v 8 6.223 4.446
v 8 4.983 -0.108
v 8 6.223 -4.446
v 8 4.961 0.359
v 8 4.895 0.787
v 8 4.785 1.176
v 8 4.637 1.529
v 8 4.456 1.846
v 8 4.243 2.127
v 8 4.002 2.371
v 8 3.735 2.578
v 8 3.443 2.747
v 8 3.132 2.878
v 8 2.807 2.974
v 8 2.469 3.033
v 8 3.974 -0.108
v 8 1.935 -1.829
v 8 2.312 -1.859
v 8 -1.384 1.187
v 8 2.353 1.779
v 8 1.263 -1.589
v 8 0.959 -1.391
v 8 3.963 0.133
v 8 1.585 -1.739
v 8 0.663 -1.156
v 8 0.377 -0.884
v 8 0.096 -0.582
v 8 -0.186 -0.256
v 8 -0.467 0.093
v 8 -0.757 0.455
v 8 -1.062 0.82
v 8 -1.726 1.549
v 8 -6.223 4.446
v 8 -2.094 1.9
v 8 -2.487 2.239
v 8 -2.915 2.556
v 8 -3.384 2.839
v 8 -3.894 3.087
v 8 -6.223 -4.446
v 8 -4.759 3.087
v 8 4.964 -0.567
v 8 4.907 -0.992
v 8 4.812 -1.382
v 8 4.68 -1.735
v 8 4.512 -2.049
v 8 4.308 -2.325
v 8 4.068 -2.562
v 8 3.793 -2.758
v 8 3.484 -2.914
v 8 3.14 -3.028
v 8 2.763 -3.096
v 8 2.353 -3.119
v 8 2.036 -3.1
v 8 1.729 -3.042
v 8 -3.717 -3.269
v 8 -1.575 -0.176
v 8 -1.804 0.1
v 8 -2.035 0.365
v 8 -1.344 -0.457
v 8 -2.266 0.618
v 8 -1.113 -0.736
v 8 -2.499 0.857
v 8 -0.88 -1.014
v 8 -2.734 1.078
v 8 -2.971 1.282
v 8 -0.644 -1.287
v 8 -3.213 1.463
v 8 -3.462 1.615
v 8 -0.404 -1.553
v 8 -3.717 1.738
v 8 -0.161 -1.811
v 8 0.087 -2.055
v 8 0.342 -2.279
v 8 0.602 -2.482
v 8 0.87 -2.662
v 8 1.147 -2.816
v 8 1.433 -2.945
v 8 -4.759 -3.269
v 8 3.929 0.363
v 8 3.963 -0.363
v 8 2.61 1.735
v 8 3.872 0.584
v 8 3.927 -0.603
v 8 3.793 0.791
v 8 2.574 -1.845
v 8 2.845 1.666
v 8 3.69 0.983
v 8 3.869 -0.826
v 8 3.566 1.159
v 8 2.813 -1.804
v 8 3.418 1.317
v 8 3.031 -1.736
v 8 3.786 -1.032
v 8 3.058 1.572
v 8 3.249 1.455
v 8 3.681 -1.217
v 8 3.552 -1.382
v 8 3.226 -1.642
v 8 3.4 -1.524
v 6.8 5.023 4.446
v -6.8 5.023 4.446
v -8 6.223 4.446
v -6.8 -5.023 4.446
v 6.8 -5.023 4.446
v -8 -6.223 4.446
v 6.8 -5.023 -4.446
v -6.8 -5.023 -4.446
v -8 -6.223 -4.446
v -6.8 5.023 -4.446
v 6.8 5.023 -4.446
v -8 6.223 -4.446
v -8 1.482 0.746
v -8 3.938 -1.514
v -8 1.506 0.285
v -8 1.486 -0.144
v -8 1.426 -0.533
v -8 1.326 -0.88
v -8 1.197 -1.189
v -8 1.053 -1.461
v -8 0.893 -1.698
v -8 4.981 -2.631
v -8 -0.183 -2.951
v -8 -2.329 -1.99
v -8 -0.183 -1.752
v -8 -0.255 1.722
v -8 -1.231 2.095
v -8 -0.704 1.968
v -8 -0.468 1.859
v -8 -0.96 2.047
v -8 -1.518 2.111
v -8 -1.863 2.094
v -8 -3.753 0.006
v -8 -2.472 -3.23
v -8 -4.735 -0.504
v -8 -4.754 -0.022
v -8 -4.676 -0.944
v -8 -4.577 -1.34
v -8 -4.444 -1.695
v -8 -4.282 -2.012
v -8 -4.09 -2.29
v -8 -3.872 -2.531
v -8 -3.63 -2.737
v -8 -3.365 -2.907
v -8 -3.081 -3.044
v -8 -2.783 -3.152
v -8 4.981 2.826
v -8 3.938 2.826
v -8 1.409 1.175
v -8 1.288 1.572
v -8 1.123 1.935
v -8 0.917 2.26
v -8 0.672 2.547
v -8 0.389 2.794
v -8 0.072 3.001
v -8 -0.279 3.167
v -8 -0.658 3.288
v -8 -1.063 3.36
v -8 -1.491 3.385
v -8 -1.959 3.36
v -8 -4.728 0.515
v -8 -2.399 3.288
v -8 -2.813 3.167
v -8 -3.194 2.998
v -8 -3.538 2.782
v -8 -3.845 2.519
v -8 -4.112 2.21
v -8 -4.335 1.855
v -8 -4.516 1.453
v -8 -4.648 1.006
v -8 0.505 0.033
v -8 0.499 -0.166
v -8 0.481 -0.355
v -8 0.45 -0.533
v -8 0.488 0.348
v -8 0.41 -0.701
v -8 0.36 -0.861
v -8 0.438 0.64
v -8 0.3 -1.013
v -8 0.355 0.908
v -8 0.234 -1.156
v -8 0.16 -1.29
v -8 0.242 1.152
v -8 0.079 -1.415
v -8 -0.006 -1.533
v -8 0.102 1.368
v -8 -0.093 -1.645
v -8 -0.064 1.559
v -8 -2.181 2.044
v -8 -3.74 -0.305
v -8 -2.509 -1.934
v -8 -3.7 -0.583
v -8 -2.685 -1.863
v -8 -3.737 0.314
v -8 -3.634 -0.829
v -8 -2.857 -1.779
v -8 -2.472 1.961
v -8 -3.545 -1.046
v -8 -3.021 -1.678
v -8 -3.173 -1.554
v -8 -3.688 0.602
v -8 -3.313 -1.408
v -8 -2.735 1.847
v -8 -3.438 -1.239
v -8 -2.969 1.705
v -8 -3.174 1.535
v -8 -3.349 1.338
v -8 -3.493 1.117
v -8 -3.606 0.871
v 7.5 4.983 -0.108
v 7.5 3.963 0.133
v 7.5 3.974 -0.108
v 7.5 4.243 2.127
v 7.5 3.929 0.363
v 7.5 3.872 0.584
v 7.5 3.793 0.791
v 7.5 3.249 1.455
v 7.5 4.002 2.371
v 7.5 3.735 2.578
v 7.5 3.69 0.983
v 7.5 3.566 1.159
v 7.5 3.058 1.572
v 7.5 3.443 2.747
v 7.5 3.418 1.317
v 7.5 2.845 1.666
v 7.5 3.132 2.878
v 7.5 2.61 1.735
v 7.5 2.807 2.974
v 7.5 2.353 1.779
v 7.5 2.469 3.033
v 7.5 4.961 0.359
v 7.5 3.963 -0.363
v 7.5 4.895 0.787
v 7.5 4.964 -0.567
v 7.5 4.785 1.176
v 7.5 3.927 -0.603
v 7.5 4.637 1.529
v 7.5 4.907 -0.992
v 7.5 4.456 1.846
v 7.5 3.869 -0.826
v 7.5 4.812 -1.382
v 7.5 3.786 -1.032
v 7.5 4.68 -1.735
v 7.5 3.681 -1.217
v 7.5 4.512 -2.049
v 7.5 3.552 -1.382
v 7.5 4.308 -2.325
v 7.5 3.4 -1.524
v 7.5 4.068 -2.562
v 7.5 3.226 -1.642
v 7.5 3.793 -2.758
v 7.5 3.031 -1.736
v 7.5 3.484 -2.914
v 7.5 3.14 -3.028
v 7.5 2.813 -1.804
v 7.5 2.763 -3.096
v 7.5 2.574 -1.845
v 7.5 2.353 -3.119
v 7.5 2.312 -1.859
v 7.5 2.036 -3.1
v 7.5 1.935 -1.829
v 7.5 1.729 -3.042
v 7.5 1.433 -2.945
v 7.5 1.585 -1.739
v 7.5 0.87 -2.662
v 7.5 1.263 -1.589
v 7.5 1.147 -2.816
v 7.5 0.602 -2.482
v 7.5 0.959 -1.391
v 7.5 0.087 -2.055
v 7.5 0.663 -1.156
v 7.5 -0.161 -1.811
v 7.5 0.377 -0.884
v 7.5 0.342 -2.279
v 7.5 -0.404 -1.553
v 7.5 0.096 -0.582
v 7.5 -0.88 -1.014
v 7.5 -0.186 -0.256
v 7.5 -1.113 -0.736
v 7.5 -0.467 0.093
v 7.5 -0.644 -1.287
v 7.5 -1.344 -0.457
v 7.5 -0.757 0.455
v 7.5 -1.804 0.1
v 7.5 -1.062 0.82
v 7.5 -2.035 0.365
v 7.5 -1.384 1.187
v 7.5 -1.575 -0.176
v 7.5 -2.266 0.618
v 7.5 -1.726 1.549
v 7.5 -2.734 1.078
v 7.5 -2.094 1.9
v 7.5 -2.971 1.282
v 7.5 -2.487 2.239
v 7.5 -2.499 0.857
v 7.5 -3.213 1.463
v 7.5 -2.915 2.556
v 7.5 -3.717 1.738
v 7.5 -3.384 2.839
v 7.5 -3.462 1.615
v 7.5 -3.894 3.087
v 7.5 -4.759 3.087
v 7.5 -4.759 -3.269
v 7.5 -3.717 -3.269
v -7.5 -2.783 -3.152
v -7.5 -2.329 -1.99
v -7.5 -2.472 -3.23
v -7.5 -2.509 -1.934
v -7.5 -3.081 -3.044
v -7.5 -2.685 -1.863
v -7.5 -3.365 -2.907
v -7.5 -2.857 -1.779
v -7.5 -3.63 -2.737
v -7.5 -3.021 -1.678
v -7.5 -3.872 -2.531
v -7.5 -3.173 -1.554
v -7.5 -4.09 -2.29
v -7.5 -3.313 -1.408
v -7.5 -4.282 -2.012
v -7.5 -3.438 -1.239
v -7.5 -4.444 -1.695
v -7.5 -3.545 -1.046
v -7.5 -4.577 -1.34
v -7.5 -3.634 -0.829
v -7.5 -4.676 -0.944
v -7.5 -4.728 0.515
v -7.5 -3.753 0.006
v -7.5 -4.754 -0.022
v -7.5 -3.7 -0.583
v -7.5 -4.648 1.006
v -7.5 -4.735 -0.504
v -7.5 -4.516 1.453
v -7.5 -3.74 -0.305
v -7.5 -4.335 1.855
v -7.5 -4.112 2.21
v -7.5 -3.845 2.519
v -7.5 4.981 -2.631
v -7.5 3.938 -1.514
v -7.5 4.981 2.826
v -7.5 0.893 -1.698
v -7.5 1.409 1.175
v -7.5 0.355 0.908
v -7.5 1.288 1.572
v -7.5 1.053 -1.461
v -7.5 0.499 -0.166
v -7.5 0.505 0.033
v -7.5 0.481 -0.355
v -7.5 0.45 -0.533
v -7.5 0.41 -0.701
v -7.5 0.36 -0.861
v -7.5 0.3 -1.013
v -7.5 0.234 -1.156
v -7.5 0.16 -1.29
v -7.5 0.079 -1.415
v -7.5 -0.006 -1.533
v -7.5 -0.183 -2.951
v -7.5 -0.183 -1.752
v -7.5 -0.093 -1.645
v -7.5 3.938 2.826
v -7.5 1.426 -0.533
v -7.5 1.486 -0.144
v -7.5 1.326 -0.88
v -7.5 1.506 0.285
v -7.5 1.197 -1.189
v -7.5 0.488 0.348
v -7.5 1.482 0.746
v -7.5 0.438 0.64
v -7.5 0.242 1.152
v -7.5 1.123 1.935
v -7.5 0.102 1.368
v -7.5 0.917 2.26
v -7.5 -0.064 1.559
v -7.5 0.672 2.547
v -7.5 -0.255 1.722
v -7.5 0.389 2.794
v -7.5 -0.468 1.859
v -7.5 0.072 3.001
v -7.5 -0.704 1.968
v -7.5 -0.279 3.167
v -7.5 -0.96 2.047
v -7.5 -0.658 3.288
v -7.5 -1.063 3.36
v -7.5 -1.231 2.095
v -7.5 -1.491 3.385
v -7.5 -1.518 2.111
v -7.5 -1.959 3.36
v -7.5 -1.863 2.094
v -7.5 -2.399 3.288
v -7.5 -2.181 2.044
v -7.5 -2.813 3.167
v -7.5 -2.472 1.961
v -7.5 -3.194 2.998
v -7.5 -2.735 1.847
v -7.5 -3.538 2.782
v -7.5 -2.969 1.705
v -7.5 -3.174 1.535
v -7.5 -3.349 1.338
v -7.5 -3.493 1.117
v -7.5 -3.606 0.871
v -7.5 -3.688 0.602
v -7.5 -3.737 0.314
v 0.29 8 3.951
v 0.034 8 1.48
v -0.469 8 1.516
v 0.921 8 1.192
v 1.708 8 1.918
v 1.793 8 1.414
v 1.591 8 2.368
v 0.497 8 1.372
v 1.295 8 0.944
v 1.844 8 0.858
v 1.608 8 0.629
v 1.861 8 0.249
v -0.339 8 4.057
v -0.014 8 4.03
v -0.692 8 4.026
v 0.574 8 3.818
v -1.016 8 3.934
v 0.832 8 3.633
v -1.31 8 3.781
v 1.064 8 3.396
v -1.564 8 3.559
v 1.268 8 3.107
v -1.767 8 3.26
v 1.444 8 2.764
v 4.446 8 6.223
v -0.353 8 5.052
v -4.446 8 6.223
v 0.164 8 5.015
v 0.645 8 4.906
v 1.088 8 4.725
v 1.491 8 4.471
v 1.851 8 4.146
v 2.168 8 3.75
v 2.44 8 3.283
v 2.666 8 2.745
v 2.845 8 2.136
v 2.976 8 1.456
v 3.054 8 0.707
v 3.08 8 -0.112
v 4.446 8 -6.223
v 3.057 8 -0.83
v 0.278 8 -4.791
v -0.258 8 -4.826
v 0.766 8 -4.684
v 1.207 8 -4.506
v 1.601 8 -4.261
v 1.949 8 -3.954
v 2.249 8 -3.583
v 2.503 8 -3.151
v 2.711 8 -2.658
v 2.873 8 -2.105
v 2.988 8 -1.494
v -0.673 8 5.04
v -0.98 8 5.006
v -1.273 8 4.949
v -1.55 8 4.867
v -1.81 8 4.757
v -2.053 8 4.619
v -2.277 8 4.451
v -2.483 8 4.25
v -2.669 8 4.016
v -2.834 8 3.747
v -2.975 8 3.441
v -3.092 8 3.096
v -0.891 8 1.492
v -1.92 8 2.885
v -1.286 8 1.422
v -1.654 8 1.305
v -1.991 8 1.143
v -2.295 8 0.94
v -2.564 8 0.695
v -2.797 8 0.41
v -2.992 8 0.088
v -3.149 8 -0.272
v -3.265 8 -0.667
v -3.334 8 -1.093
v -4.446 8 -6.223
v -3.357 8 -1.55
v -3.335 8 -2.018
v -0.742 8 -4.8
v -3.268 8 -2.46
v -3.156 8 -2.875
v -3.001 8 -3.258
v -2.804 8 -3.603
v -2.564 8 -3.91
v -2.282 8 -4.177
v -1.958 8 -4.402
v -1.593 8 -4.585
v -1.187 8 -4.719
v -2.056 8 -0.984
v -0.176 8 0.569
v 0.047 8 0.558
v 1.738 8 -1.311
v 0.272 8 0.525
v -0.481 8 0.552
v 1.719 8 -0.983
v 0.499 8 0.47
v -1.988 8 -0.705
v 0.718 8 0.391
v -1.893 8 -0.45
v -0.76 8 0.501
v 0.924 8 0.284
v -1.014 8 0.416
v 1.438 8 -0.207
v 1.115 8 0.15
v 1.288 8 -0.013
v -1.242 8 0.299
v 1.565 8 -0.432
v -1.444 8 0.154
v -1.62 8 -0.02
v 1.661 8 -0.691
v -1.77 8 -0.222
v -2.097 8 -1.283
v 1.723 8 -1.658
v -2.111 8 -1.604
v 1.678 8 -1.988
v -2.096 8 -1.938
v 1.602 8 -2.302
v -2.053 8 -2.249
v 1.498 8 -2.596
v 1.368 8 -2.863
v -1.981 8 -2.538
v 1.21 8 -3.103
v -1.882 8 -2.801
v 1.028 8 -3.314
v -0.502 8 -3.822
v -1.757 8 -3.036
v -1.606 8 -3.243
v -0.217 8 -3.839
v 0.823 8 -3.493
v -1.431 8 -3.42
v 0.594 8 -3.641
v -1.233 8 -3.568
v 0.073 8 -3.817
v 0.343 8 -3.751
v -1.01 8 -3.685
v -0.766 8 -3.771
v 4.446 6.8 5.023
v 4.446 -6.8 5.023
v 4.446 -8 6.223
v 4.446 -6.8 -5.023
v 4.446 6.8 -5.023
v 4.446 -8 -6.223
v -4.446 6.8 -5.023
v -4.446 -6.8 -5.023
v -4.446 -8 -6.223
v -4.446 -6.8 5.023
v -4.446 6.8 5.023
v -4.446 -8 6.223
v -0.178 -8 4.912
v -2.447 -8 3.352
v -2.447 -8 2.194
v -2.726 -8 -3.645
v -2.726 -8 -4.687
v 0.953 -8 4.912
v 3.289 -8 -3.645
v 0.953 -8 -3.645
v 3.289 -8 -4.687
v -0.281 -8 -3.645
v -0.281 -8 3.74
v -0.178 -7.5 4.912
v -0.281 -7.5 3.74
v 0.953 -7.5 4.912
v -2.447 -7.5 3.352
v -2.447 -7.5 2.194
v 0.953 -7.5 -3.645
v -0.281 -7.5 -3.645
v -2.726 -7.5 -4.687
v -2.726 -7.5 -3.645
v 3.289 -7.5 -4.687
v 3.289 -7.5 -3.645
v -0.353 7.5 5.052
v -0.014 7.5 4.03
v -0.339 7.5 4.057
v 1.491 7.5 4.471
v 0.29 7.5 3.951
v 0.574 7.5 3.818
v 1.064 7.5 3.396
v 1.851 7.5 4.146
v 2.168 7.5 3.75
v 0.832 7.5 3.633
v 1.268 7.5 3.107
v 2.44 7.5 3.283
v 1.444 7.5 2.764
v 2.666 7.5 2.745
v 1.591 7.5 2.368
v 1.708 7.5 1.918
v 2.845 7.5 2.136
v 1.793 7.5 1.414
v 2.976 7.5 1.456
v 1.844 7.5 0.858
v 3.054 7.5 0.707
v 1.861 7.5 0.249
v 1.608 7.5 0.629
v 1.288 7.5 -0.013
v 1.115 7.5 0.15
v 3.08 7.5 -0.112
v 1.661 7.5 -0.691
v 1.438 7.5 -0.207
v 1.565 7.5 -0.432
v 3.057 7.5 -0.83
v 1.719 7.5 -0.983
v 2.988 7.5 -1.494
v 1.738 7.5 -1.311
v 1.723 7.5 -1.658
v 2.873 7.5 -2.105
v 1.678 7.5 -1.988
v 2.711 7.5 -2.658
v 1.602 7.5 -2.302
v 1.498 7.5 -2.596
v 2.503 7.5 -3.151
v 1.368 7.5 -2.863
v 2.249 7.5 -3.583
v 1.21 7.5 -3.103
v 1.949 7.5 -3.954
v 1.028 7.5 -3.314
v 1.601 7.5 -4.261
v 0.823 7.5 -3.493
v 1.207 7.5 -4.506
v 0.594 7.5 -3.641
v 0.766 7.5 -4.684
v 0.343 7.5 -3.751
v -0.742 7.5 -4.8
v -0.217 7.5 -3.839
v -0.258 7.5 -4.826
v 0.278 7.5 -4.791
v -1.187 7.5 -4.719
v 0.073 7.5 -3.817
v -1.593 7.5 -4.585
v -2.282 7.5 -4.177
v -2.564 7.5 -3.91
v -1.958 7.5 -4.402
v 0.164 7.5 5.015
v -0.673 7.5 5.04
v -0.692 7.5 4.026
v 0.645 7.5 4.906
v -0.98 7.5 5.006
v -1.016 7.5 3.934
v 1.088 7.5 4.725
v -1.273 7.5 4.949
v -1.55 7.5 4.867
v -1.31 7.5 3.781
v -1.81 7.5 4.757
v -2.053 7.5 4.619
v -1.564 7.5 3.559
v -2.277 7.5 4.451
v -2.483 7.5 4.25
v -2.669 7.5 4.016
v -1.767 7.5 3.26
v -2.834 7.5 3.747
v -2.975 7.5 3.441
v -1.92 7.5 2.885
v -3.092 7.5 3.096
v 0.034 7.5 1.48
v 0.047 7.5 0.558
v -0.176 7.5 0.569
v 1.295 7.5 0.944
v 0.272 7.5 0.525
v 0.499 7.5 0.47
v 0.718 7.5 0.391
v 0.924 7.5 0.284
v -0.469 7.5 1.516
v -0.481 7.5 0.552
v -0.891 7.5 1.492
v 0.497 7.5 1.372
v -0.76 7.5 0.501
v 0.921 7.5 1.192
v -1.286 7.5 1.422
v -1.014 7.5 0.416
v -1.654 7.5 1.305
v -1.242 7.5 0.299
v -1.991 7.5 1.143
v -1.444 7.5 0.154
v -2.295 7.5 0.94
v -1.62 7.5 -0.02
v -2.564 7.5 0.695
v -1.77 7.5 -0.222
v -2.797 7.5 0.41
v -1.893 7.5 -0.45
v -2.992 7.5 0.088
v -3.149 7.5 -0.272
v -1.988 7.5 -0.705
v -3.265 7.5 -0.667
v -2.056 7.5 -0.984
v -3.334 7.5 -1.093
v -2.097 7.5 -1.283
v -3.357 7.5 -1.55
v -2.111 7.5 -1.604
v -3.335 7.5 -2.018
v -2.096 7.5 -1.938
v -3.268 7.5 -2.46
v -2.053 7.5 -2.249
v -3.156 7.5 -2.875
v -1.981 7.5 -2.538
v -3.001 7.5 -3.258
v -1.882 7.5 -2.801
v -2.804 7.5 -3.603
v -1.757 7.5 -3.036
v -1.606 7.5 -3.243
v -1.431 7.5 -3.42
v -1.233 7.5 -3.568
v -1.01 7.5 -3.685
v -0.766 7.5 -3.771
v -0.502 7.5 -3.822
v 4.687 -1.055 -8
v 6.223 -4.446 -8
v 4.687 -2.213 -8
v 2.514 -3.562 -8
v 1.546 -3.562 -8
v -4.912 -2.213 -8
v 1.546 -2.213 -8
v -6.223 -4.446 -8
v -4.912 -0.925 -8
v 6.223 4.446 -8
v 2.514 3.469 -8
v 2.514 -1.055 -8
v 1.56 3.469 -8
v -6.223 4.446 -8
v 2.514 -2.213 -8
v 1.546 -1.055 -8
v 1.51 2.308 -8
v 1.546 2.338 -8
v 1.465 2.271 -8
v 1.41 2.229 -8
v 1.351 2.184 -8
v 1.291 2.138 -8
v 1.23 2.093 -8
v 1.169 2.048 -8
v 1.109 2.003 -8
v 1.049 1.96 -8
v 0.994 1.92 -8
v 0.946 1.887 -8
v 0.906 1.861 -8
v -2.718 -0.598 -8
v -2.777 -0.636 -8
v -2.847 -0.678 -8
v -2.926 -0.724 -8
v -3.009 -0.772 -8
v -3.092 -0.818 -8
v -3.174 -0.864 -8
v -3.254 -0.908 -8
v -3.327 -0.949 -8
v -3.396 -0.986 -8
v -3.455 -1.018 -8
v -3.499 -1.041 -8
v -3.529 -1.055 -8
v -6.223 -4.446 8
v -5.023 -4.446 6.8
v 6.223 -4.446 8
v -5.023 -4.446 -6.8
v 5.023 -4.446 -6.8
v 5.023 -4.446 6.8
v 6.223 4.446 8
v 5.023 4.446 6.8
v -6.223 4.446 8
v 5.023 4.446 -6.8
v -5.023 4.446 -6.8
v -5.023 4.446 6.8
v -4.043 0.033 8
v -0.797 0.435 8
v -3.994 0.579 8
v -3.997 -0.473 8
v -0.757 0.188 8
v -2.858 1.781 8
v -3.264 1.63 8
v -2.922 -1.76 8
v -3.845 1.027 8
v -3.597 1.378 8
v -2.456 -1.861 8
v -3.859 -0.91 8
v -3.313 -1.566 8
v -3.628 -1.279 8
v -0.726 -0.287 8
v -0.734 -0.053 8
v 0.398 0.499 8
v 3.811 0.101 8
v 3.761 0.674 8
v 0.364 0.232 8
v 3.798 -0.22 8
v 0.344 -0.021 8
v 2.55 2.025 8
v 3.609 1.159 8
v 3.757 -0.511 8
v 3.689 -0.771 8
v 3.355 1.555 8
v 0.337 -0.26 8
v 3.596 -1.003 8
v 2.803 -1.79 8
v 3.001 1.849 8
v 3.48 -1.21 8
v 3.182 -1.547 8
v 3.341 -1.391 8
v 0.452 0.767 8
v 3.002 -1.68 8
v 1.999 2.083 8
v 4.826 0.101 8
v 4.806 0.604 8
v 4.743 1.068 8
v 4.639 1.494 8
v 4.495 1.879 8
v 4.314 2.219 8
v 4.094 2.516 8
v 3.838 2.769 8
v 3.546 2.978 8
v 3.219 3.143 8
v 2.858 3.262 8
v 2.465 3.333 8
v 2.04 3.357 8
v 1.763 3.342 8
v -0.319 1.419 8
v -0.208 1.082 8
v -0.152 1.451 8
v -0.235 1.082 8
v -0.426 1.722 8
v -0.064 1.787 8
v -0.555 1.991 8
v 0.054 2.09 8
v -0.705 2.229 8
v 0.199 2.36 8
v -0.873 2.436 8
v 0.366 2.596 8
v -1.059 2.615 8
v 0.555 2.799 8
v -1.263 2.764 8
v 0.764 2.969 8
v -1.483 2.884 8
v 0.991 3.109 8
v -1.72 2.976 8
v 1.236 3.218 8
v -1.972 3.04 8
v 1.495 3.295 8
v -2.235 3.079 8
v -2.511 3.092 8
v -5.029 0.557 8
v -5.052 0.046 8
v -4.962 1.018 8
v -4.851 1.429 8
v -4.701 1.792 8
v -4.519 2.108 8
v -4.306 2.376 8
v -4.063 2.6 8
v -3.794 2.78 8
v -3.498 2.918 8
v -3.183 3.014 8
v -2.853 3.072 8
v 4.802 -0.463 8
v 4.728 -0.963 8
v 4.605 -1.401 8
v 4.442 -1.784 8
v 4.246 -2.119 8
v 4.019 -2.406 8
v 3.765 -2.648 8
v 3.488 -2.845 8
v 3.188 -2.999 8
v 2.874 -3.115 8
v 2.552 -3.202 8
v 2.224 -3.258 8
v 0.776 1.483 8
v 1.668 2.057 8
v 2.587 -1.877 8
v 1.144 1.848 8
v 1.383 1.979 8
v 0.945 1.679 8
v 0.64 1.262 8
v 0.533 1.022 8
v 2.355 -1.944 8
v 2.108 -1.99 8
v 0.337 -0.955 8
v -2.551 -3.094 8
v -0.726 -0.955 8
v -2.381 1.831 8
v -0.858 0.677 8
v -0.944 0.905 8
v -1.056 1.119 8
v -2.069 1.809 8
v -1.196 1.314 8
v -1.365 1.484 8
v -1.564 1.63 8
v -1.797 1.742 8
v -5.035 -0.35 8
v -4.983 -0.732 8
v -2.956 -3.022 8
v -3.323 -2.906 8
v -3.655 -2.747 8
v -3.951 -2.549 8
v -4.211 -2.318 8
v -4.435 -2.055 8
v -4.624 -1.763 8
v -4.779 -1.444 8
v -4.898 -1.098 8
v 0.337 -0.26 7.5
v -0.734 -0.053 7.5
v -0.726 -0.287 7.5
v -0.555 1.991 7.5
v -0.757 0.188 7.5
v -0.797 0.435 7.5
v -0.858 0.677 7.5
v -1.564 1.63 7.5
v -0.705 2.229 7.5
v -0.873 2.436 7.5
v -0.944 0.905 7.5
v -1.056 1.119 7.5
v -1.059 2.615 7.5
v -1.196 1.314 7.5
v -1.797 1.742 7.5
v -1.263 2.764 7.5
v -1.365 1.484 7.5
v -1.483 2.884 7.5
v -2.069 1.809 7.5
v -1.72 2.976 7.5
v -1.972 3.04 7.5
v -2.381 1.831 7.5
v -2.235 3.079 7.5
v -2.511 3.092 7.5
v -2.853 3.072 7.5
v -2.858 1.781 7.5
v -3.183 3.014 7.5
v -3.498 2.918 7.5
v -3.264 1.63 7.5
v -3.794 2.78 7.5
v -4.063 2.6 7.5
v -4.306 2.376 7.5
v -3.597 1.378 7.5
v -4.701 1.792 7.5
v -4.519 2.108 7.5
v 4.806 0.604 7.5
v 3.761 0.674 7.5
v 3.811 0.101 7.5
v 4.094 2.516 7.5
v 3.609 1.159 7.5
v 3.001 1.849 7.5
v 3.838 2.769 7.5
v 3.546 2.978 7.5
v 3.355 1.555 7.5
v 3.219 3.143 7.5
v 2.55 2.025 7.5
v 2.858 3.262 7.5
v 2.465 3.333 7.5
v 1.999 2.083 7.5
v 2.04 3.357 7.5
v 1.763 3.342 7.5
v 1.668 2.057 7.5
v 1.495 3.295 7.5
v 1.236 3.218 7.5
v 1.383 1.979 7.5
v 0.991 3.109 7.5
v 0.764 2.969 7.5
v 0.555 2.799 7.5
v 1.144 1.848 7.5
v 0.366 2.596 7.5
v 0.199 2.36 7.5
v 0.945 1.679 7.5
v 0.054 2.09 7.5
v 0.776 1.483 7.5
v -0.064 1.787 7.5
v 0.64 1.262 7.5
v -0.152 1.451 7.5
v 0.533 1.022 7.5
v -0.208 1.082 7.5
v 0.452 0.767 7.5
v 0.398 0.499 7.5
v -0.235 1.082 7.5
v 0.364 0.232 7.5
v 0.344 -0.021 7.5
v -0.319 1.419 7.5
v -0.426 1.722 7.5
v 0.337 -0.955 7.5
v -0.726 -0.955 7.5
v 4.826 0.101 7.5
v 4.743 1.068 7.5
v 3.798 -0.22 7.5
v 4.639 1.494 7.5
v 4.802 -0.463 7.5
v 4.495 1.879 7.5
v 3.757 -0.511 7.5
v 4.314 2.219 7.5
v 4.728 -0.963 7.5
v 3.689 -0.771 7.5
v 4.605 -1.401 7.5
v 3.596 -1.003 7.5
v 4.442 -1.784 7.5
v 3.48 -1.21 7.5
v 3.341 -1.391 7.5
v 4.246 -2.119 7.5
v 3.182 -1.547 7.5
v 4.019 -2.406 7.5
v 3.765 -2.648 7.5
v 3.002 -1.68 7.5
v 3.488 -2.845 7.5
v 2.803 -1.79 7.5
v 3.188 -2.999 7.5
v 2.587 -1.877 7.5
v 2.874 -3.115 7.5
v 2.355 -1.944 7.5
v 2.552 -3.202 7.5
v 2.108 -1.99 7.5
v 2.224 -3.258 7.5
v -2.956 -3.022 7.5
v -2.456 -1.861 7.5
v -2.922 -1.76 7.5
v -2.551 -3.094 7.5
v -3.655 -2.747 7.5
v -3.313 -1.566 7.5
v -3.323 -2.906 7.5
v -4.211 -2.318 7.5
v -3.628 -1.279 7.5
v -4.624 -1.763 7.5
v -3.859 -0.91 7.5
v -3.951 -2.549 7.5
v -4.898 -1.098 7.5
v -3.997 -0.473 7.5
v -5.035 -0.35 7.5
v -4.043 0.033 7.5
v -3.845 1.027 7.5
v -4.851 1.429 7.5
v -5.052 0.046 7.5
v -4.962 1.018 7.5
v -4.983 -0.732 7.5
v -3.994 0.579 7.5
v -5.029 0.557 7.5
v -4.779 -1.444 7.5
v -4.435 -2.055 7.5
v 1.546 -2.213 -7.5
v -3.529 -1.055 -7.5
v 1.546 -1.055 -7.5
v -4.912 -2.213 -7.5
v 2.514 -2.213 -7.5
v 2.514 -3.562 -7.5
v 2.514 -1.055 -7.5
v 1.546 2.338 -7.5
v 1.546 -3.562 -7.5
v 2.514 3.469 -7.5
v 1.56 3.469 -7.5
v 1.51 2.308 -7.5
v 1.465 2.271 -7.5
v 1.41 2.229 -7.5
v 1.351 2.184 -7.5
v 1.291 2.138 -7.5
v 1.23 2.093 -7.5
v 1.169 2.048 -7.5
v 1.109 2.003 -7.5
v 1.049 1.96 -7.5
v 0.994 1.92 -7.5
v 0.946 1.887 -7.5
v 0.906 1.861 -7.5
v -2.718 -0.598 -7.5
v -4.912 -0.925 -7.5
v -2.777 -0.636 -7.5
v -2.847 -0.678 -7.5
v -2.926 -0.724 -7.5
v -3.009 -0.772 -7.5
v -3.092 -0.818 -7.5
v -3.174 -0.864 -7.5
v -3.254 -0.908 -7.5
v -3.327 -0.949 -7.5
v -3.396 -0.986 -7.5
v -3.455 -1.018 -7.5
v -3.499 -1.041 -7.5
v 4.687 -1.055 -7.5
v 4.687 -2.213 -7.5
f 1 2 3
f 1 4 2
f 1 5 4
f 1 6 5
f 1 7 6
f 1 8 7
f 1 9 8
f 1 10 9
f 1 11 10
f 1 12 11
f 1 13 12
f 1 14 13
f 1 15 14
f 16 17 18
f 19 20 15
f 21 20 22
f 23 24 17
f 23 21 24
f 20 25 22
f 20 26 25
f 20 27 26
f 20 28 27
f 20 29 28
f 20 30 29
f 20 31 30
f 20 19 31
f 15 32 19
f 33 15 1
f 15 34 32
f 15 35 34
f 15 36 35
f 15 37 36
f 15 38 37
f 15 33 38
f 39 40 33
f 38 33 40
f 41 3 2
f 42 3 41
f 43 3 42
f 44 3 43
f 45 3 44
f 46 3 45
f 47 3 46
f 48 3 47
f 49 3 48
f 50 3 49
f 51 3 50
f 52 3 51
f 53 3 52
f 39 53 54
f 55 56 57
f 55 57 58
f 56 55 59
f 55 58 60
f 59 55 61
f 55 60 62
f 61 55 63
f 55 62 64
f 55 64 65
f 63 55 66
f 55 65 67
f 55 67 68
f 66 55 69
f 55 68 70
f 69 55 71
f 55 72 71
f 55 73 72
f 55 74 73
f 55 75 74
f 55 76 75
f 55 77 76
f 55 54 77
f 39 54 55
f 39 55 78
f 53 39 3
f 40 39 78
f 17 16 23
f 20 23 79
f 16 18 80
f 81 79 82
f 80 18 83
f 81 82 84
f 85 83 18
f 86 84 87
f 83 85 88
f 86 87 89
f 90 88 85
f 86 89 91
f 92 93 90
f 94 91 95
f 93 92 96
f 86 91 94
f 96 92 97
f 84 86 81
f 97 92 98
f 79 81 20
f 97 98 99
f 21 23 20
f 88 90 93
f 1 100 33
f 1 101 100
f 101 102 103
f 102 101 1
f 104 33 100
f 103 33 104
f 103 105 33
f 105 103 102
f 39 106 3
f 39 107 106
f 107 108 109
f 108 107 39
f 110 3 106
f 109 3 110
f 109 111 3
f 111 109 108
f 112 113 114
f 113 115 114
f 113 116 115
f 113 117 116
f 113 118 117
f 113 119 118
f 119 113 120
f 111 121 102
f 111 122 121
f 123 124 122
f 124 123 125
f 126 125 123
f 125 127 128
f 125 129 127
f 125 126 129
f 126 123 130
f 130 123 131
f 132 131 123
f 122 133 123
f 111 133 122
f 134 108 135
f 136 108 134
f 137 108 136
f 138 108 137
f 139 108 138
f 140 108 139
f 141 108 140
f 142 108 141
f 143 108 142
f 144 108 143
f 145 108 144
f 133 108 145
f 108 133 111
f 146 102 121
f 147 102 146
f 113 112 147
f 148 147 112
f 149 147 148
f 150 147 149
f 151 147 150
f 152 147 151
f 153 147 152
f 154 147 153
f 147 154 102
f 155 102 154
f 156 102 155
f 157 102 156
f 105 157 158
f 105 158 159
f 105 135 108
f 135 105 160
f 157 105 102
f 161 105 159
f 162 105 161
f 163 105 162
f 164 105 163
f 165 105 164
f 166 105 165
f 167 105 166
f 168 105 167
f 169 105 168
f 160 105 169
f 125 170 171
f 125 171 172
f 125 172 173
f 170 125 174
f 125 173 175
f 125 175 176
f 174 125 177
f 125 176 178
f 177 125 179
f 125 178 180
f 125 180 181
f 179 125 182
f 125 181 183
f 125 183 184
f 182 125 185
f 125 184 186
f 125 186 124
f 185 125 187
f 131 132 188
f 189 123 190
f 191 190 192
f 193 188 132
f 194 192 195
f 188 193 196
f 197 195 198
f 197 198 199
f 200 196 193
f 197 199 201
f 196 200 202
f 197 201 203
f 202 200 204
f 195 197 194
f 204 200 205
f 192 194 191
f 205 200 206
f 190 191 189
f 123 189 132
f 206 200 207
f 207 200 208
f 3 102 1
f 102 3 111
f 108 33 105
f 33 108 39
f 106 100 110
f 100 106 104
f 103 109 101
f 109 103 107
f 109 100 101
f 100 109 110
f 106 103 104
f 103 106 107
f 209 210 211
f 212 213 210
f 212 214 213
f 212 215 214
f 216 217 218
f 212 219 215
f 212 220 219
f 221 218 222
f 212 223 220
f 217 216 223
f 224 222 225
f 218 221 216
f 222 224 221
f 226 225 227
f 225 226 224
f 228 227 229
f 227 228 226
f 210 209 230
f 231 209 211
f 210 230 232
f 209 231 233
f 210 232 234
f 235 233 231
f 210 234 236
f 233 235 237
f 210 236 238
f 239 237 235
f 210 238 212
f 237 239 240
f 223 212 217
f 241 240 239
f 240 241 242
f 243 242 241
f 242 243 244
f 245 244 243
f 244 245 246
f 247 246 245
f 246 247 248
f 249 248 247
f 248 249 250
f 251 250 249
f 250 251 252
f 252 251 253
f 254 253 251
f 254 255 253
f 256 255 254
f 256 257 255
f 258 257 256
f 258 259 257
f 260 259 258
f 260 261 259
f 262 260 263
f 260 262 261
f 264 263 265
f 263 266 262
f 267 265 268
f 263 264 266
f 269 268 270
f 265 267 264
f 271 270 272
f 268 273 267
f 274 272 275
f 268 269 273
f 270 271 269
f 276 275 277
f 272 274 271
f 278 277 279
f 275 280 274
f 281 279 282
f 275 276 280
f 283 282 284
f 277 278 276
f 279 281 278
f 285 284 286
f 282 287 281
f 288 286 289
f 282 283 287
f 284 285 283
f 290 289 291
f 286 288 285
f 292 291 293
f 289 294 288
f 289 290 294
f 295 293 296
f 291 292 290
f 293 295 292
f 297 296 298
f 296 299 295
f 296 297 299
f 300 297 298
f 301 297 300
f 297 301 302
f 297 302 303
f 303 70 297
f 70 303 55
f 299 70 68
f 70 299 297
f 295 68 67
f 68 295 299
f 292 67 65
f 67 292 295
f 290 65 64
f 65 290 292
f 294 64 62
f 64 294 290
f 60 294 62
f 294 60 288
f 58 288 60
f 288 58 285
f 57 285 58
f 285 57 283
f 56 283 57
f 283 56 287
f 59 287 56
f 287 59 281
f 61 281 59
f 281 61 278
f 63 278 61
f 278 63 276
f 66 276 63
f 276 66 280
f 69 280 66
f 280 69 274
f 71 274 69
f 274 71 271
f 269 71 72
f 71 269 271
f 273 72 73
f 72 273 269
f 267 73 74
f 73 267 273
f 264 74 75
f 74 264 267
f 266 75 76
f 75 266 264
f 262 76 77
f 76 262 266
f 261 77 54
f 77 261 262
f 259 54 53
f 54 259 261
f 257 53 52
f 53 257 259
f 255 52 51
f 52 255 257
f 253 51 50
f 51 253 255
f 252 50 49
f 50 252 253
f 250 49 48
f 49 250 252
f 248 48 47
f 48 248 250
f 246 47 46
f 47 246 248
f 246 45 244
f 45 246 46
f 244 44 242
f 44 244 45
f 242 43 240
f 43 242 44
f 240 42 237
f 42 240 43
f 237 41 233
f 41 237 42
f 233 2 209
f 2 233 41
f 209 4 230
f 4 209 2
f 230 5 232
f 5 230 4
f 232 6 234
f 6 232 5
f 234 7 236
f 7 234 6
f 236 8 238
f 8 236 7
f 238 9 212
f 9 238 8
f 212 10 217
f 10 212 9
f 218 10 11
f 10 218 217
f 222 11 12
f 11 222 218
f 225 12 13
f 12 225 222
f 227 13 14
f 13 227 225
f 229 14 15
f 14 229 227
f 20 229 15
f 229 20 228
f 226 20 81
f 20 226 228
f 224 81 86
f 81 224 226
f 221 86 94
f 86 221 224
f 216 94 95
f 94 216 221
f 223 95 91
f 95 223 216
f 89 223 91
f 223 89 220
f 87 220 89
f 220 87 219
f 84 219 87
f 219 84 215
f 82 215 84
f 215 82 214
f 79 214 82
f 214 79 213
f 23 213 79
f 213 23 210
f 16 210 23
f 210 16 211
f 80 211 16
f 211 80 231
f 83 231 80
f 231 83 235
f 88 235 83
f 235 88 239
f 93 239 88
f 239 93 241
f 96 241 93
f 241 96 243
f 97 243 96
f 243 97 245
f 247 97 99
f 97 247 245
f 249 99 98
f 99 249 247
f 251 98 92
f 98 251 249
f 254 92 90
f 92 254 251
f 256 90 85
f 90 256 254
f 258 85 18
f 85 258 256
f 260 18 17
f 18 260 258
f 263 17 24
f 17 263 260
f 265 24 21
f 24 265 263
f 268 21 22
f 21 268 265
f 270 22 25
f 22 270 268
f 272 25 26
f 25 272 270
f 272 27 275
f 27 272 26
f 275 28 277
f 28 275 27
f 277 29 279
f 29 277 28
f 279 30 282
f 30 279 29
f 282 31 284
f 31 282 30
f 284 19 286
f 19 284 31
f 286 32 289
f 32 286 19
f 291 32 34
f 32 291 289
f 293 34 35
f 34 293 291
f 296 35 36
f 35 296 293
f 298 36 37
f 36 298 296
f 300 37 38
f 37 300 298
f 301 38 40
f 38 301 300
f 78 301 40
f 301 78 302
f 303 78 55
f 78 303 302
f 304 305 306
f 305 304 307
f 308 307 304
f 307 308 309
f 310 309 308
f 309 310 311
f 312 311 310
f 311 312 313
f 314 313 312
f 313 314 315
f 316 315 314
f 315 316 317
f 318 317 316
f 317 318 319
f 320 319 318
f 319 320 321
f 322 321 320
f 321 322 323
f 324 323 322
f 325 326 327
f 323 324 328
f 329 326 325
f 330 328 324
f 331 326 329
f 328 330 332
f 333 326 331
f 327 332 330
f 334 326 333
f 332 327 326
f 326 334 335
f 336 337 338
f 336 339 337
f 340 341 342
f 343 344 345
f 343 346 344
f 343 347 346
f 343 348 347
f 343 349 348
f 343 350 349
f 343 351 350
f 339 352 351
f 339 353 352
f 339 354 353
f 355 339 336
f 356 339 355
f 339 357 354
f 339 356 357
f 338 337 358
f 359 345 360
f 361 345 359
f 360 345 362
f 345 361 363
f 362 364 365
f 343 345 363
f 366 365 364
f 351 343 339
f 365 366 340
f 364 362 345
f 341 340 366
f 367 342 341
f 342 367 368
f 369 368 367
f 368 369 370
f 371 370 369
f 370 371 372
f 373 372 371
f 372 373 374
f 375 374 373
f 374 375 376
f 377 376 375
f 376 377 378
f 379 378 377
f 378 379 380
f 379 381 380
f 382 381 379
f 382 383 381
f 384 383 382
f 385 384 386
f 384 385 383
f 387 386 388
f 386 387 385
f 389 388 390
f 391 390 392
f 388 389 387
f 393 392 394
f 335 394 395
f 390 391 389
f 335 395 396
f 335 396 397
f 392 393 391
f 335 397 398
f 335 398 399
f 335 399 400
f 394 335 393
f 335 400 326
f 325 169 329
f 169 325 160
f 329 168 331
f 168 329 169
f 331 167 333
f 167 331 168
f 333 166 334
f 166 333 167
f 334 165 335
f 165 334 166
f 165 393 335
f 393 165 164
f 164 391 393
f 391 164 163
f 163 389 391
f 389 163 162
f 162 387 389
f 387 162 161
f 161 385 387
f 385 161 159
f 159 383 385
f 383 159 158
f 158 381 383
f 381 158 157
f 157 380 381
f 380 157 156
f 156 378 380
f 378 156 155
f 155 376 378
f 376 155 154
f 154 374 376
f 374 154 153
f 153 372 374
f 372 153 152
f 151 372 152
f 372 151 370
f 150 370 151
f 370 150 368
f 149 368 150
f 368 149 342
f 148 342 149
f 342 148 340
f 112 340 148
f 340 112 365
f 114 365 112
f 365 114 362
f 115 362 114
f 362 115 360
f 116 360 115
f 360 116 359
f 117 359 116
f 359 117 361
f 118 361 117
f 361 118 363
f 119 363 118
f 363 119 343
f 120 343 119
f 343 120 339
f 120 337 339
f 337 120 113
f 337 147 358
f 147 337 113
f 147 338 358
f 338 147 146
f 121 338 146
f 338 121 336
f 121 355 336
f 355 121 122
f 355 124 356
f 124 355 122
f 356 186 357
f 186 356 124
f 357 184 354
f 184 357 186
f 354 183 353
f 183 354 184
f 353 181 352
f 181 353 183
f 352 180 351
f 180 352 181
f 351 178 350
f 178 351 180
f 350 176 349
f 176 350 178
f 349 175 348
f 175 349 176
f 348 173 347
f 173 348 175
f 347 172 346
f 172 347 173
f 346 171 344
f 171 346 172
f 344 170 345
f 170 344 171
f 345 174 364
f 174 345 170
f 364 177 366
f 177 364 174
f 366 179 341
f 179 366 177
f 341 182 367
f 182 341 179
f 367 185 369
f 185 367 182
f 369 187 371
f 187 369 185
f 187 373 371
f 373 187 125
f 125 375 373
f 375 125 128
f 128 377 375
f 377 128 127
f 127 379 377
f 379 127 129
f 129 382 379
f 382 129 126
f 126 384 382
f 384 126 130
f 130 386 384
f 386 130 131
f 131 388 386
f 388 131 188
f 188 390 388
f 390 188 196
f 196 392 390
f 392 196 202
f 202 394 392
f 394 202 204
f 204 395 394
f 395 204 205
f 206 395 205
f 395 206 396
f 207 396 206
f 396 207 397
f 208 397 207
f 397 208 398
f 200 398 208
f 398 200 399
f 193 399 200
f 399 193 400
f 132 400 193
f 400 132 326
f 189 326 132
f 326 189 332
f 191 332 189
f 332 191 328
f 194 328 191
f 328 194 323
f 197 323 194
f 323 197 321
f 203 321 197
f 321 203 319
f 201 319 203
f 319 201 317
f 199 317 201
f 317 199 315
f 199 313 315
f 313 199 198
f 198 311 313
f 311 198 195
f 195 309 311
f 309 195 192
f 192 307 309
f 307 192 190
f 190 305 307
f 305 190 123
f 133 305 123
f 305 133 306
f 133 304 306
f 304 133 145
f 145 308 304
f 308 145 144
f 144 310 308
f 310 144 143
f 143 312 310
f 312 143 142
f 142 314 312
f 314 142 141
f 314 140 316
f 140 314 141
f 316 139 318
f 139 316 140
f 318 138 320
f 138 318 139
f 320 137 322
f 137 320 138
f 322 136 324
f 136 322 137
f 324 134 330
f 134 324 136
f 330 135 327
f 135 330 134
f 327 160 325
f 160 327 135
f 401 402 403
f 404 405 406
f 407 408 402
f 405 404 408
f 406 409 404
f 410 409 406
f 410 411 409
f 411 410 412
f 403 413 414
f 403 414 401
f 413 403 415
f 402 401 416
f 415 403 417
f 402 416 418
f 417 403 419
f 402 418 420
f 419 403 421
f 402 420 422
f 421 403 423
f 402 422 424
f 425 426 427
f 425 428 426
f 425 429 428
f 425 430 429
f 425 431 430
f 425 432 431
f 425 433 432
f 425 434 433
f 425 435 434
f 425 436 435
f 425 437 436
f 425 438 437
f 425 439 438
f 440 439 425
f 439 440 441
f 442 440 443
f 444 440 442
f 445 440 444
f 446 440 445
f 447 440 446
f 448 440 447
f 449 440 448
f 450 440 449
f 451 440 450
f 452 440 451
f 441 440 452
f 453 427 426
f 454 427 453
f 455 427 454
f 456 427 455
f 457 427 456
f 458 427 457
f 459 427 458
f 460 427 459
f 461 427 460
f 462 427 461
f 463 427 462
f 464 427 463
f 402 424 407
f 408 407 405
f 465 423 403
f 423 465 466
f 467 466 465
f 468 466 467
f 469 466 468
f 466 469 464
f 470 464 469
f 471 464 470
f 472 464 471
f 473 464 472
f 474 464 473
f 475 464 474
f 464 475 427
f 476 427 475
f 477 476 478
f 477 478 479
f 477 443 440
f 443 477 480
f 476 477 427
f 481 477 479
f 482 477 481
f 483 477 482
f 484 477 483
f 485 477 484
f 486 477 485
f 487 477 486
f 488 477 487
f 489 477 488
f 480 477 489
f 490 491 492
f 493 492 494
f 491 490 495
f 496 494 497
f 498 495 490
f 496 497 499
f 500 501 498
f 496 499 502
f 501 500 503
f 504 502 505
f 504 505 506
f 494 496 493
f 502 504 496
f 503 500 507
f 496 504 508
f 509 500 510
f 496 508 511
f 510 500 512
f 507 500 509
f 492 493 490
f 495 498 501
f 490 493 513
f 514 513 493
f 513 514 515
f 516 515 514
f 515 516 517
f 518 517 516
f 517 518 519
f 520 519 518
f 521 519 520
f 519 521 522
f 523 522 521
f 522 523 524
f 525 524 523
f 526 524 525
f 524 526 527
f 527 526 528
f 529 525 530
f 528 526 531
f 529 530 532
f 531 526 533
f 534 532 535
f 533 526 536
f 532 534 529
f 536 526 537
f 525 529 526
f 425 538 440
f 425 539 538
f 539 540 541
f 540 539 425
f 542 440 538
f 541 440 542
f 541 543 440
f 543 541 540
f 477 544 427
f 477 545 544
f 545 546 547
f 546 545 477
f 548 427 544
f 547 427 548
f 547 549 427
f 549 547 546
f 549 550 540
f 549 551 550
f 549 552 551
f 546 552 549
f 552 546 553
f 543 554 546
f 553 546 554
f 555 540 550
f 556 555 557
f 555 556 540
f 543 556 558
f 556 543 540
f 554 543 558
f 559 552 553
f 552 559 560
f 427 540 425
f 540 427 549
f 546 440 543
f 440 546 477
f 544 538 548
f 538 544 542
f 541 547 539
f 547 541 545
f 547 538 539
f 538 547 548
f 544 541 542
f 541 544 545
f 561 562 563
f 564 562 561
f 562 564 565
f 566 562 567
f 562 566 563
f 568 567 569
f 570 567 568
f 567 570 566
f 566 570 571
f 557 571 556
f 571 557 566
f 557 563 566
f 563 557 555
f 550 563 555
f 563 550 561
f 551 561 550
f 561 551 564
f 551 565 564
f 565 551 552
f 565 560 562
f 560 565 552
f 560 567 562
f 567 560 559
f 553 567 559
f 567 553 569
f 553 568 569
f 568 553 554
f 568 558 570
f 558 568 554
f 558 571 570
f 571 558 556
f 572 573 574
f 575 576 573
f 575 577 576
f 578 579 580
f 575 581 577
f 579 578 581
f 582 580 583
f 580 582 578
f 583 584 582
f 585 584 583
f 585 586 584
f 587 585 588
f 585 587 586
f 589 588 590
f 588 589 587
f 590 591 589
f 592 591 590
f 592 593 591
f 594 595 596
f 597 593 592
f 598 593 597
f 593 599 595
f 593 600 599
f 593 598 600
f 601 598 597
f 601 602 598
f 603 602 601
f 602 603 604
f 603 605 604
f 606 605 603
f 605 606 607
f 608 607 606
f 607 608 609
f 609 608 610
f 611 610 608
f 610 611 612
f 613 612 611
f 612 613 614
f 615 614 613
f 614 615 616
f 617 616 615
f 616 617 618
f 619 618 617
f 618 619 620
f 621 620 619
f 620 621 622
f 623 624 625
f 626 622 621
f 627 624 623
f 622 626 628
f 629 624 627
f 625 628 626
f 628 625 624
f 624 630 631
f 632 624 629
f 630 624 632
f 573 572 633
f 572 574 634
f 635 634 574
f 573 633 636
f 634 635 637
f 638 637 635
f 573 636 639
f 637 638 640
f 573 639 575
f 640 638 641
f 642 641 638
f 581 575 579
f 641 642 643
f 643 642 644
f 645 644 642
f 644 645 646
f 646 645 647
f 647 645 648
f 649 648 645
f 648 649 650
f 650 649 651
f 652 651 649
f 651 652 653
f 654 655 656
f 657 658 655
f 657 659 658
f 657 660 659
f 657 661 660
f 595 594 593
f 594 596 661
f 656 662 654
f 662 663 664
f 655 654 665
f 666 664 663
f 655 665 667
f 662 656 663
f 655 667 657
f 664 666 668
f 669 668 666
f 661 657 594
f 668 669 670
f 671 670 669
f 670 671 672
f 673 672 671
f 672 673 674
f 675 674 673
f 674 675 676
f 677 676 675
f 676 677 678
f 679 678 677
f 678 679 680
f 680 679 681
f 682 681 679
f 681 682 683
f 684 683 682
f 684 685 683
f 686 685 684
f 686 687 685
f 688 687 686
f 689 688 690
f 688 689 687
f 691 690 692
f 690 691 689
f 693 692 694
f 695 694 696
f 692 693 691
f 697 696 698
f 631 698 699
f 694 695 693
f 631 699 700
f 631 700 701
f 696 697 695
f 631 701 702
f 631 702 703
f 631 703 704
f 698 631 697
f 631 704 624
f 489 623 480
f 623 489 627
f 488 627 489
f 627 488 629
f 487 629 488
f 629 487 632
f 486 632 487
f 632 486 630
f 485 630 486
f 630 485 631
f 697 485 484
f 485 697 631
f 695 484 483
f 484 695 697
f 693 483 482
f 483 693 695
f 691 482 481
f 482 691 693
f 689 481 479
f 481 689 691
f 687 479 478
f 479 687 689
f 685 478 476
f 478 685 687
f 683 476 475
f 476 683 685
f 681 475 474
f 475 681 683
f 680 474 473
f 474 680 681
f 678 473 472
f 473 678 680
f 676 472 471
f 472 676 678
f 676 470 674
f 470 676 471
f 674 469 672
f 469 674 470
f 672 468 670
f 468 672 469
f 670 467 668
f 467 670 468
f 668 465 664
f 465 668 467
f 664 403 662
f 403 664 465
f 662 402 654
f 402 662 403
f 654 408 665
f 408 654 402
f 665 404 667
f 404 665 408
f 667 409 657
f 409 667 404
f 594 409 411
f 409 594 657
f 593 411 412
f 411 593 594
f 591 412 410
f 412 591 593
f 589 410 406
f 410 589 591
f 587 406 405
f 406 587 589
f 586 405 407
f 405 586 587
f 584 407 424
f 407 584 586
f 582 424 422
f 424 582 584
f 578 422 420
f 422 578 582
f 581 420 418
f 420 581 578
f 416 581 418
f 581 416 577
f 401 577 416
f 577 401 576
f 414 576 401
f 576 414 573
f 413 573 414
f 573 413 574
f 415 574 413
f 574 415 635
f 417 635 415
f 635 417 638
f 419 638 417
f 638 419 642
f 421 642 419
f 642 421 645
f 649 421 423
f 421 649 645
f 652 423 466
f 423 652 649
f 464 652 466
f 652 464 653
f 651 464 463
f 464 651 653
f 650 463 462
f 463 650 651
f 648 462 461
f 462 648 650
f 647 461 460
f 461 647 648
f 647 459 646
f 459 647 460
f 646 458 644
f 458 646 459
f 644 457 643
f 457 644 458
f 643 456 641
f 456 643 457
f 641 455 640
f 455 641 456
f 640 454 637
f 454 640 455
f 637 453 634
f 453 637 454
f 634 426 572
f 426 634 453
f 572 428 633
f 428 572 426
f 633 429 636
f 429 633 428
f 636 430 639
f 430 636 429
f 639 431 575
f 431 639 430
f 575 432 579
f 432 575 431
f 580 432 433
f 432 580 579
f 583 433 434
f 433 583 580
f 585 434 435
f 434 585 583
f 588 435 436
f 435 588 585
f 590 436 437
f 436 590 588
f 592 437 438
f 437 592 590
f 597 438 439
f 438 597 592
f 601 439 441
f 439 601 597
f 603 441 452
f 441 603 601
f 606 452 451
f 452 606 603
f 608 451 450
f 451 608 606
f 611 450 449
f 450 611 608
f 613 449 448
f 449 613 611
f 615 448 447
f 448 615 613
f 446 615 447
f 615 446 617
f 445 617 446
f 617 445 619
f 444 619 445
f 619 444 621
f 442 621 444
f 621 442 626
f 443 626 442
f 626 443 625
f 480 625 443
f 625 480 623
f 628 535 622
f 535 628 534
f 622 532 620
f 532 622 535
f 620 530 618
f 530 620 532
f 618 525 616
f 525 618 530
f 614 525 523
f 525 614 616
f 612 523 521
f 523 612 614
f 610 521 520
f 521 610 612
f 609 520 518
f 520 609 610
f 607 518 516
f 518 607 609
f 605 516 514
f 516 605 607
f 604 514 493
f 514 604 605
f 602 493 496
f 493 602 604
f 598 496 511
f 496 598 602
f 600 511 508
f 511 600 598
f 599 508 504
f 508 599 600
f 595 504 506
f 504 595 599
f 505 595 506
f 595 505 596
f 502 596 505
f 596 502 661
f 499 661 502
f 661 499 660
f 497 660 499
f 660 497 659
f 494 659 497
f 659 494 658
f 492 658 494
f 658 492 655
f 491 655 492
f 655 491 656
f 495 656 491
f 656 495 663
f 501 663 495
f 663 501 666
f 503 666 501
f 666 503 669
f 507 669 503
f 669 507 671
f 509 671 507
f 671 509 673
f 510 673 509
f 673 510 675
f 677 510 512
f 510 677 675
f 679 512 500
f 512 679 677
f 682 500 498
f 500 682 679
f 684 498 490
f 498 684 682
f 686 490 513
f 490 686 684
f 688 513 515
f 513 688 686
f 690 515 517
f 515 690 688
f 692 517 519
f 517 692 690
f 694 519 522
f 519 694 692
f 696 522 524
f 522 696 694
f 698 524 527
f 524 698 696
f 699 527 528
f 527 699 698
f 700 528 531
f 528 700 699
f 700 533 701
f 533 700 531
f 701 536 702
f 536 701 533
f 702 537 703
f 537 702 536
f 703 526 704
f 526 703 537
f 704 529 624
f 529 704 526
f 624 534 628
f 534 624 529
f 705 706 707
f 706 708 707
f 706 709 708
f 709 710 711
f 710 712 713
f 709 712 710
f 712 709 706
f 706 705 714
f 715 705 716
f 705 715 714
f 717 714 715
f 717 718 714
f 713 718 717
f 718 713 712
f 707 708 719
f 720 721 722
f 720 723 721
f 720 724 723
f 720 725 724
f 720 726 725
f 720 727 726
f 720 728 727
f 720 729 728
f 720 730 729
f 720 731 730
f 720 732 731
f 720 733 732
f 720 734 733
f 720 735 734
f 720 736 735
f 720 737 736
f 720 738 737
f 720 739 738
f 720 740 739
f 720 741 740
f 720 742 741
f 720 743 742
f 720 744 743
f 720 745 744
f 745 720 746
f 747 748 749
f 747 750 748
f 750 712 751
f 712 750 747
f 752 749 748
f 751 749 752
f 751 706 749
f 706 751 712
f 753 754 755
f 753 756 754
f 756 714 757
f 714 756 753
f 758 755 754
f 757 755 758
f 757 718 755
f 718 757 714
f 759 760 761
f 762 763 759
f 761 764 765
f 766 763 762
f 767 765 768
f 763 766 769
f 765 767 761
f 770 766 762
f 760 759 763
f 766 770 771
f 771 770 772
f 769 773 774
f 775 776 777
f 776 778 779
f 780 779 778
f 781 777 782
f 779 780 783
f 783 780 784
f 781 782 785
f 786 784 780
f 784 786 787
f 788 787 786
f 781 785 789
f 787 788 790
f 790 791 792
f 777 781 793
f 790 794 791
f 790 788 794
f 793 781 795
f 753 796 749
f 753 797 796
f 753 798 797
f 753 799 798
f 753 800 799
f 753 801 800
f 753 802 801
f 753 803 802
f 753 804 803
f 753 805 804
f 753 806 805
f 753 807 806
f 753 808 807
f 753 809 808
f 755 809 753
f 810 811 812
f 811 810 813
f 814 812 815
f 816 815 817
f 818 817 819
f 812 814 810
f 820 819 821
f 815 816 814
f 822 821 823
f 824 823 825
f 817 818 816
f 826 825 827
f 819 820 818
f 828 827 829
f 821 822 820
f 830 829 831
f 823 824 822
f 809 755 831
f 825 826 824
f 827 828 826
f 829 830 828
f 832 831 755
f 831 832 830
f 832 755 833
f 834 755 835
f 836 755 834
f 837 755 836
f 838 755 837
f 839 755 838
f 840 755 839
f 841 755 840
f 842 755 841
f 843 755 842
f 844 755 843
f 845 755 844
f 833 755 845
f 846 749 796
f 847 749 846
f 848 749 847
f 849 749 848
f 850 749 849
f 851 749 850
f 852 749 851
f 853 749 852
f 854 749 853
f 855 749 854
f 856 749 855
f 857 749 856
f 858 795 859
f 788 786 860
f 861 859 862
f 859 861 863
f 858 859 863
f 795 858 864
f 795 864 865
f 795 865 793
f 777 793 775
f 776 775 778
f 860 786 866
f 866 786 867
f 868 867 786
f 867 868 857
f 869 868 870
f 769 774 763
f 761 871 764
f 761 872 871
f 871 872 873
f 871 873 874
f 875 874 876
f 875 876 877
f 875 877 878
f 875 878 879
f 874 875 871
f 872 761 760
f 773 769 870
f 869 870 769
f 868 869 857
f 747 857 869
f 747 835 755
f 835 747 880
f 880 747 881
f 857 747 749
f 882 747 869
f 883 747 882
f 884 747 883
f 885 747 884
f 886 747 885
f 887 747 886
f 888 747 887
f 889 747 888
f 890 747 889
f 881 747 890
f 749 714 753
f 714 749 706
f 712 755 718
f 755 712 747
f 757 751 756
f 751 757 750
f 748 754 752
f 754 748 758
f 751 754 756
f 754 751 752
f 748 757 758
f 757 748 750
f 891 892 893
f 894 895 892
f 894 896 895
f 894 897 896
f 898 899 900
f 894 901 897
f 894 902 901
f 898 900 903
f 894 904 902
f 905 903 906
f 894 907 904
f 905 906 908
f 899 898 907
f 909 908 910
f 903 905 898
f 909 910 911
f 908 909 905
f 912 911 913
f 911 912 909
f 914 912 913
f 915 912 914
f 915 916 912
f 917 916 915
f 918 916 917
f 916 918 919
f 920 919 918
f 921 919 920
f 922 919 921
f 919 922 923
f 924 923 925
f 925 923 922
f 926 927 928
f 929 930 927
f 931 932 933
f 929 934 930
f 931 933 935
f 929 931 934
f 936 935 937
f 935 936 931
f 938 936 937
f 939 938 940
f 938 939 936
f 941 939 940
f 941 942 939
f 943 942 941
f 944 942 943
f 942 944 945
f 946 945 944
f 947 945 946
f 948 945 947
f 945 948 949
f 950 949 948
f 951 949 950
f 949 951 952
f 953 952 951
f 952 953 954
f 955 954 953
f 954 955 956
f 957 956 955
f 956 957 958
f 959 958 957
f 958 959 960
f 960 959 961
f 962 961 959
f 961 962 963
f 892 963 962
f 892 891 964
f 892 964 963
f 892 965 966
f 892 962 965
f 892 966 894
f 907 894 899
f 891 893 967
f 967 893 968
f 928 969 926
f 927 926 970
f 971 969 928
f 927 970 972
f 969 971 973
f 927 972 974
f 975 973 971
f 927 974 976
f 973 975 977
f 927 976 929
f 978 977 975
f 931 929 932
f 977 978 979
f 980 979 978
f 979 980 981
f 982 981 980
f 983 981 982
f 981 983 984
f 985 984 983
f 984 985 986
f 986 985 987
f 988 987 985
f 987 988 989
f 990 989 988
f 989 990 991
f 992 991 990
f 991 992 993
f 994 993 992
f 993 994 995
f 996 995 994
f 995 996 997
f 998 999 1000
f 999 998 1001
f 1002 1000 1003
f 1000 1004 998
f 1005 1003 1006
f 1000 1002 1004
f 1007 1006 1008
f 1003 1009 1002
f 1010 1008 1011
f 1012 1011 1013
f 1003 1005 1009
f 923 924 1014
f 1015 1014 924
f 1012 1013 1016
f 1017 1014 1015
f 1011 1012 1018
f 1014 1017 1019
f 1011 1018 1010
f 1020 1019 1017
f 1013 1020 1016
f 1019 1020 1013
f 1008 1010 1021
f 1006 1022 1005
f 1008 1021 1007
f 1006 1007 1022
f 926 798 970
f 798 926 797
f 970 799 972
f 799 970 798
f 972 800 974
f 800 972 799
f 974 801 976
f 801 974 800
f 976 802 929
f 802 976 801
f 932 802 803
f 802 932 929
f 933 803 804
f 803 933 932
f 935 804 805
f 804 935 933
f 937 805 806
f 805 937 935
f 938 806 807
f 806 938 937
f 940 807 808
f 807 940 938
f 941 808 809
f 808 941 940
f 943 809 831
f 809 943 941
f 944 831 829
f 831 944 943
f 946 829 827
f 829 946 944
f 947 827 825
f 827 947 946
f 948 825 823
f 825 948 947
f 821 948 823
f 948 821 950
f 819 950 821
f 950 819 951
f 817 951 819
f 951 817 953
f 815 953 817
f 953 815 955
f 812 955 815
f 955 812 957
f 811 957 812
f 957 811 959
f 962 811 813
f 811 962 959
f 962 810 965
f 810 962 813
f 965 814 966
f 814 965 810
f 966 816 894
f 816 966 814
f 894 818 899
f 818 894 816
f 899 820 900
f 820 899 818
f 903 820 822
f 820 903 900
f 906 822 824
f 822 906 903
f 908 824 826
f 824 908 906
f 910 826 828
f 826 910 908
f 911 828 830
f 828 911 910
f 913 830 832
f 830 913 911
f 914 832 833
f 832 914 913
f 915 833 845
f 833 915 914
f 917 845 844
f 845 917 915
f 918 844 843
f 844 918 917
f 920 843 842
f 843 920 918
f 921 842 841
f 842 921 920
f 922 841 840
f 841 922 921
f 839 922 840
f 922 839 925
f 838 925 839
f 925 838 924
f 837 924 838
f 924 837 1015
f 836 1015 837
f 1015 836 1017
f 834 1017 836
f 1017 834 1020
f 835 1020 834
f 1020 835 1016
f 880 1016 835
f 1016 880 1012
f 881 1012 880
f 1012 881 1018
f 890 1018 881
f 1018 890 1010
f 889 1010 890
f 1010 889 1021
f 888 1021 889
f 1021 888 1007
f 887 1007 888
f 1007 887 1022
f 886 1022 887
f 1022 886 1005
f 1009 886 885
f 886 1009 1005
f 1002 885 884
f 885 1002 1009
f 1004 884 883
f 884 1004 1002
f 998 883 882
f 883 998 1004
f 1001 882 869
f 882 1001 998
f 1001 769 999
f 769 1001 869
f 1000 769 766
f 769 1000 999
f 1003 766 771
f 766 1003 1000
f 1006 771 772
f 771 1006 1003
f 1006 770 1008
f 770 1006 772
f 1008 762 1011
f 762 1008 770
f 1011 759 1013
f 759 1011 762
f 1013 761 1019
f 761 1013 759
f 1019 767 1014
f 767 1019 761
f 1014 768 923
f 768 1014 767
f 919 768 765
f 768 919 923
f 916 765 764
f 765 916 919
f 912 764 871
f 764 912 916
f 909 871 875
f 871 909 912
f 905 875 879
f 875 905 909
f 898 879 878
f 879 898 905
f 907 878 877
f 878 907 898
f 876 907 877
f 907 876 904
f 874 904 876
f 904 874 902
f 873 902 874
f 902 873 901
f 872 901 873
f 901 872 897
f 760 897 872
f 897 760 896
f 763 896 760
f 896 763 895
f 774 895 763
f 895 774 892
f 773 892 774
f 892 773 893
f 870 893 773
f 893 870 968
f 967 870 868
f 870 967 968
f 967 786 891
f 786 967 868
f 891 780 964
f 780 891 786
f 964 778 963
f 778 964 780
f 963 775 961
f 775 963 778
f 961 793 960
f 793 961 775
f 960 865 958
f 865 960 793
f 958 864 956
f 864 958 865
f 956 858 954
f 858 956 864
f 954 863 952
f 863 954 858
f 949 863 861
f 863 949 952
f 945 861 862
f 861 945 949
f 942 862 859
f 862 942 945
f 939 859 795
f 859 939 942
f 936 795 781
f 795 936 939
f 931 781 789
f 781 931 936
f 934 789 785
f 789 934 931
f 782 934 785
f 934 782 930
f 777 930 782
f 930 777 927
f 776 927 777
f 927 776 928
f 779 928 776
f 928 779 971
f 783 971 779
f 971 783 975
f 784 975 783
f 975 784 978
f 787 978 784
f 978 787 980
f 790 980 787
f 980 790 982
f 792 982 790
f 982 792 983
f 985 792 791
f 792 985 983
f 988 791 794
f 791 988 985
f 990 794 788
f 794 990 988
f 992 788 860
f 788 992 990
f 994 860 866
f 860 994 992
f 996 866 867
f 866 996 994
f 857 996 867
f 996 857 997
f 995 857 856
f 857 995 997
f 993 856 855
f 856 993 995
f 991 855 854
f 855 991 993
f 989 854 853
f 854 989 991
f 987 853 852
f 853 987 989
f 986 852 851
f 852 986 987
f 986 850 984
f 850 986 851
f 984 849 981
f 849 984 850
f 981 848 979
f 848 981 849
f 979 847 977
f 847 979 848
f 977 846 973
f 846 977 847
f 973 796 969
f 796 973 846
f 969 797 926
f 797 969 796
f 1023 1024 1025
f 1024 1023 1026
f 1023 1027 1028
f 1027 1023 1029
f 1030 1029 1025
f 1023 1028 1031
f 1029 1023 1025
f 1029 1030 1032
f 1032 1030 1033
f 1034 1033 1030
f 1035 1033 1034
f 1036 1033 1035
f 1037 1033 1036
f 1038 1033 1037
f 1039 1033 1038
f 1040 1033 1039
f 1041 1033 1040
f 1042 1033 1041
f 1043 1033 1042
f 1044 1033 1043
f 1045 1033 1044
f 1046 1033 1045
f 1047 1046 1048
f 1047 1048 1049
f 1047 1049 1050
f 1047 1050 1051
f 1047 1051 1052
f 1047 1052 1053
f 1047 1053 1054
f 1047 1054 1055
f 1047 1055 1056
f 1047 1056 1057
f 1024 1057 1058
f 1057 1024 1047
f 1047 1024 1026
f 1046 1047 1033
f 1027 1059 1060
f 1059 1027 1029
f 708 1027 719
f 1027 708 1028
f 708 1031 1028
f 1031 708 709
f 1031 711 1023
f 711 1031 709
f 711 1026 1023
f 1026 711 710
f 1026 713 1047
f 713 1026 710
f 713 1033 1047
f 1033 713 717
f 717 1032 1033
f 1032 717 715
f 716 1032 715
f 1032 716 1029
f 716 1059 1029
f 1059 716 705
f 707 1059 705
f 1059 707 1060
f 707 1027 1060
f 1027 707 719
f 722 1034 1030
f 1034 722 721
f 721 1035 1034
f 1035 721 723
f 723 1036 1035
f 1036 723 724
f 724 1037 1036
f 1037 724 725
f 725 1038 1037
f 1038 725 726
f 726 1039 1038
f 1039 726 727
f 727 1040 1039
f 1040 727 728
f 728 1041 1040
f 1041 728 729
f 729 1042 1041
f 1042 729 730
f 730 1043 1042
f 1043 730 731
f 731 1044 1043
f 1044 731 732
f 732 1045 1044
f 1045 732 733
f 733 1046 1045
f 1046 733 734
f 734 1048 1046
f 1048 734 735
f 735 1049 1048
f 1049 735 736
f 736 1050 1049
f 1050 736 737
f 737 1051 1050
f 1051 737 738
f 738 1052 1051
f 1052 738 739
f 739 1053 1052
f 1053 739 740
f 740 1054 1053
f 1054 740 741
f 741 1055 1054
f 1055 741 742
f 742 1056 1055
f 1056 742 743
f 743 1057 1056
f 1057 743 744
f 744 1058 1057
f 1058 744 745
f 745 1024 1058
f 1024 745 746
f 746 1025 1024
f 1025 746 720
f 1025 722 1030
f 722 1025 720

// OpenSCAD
//outside print dimension
outside_diameter = 16;

//thickness of rings
thickness = 1.2;


//default value: 1/sqrt(3)
gap = .577;

//depth of emboss
letter_depth = .5;

o = outside_diameter/2 - letter_depth;
letter_size = outside_diameter  - 4*thickness - 2 * gap;


module letter(l) {
    // Use linear_extrude() to make the letters 3D objects as they
    // are only 2D shapes when only using text()
    linear_extrude(height = letter_depth * 1.001) {
        text(l, size = letter_size, halign = "center", valign = "center", $fn = 16);
    }
}

module ring() {
    difference(){
        cube([
            outside_diameter,
            outside_diameter - 2 * (thickness + gap),
            outside_diameter - 4 * (thickness + gap)
        ], true);
        cube([
            outside_diameter - 2 * thickness,
            outside_diameter - 4 * thickness - 2 * gap,
            outside_diameter - 4 * thickness - 2 * gap,
        ], true);
    }
}

difference() {
    rotate([00, 00, 00]) ring();
    translate([o, 0, 0]) rotate([0, 90, 0]) letter("2");
    translate([-o, 0, 0]) rotate([0, -90, 0]) letter("5");
}
difference() {
    rotate([90, 00, 90]) ring();
    translate([0, -o, 0]) rotate([90, 0, 0]) letter("1");
    translate([0, o, 0]) rotate([90, 0, 180]) letter("6");
}

difference() {
    rotate([90, 90, 00]) ring();
    translate([0, 0, o]) rotate([0, 0, 90])  letter("3");
    translate([0, 0, -o]) rotate([180, 0, -90]) letter("4");
}
